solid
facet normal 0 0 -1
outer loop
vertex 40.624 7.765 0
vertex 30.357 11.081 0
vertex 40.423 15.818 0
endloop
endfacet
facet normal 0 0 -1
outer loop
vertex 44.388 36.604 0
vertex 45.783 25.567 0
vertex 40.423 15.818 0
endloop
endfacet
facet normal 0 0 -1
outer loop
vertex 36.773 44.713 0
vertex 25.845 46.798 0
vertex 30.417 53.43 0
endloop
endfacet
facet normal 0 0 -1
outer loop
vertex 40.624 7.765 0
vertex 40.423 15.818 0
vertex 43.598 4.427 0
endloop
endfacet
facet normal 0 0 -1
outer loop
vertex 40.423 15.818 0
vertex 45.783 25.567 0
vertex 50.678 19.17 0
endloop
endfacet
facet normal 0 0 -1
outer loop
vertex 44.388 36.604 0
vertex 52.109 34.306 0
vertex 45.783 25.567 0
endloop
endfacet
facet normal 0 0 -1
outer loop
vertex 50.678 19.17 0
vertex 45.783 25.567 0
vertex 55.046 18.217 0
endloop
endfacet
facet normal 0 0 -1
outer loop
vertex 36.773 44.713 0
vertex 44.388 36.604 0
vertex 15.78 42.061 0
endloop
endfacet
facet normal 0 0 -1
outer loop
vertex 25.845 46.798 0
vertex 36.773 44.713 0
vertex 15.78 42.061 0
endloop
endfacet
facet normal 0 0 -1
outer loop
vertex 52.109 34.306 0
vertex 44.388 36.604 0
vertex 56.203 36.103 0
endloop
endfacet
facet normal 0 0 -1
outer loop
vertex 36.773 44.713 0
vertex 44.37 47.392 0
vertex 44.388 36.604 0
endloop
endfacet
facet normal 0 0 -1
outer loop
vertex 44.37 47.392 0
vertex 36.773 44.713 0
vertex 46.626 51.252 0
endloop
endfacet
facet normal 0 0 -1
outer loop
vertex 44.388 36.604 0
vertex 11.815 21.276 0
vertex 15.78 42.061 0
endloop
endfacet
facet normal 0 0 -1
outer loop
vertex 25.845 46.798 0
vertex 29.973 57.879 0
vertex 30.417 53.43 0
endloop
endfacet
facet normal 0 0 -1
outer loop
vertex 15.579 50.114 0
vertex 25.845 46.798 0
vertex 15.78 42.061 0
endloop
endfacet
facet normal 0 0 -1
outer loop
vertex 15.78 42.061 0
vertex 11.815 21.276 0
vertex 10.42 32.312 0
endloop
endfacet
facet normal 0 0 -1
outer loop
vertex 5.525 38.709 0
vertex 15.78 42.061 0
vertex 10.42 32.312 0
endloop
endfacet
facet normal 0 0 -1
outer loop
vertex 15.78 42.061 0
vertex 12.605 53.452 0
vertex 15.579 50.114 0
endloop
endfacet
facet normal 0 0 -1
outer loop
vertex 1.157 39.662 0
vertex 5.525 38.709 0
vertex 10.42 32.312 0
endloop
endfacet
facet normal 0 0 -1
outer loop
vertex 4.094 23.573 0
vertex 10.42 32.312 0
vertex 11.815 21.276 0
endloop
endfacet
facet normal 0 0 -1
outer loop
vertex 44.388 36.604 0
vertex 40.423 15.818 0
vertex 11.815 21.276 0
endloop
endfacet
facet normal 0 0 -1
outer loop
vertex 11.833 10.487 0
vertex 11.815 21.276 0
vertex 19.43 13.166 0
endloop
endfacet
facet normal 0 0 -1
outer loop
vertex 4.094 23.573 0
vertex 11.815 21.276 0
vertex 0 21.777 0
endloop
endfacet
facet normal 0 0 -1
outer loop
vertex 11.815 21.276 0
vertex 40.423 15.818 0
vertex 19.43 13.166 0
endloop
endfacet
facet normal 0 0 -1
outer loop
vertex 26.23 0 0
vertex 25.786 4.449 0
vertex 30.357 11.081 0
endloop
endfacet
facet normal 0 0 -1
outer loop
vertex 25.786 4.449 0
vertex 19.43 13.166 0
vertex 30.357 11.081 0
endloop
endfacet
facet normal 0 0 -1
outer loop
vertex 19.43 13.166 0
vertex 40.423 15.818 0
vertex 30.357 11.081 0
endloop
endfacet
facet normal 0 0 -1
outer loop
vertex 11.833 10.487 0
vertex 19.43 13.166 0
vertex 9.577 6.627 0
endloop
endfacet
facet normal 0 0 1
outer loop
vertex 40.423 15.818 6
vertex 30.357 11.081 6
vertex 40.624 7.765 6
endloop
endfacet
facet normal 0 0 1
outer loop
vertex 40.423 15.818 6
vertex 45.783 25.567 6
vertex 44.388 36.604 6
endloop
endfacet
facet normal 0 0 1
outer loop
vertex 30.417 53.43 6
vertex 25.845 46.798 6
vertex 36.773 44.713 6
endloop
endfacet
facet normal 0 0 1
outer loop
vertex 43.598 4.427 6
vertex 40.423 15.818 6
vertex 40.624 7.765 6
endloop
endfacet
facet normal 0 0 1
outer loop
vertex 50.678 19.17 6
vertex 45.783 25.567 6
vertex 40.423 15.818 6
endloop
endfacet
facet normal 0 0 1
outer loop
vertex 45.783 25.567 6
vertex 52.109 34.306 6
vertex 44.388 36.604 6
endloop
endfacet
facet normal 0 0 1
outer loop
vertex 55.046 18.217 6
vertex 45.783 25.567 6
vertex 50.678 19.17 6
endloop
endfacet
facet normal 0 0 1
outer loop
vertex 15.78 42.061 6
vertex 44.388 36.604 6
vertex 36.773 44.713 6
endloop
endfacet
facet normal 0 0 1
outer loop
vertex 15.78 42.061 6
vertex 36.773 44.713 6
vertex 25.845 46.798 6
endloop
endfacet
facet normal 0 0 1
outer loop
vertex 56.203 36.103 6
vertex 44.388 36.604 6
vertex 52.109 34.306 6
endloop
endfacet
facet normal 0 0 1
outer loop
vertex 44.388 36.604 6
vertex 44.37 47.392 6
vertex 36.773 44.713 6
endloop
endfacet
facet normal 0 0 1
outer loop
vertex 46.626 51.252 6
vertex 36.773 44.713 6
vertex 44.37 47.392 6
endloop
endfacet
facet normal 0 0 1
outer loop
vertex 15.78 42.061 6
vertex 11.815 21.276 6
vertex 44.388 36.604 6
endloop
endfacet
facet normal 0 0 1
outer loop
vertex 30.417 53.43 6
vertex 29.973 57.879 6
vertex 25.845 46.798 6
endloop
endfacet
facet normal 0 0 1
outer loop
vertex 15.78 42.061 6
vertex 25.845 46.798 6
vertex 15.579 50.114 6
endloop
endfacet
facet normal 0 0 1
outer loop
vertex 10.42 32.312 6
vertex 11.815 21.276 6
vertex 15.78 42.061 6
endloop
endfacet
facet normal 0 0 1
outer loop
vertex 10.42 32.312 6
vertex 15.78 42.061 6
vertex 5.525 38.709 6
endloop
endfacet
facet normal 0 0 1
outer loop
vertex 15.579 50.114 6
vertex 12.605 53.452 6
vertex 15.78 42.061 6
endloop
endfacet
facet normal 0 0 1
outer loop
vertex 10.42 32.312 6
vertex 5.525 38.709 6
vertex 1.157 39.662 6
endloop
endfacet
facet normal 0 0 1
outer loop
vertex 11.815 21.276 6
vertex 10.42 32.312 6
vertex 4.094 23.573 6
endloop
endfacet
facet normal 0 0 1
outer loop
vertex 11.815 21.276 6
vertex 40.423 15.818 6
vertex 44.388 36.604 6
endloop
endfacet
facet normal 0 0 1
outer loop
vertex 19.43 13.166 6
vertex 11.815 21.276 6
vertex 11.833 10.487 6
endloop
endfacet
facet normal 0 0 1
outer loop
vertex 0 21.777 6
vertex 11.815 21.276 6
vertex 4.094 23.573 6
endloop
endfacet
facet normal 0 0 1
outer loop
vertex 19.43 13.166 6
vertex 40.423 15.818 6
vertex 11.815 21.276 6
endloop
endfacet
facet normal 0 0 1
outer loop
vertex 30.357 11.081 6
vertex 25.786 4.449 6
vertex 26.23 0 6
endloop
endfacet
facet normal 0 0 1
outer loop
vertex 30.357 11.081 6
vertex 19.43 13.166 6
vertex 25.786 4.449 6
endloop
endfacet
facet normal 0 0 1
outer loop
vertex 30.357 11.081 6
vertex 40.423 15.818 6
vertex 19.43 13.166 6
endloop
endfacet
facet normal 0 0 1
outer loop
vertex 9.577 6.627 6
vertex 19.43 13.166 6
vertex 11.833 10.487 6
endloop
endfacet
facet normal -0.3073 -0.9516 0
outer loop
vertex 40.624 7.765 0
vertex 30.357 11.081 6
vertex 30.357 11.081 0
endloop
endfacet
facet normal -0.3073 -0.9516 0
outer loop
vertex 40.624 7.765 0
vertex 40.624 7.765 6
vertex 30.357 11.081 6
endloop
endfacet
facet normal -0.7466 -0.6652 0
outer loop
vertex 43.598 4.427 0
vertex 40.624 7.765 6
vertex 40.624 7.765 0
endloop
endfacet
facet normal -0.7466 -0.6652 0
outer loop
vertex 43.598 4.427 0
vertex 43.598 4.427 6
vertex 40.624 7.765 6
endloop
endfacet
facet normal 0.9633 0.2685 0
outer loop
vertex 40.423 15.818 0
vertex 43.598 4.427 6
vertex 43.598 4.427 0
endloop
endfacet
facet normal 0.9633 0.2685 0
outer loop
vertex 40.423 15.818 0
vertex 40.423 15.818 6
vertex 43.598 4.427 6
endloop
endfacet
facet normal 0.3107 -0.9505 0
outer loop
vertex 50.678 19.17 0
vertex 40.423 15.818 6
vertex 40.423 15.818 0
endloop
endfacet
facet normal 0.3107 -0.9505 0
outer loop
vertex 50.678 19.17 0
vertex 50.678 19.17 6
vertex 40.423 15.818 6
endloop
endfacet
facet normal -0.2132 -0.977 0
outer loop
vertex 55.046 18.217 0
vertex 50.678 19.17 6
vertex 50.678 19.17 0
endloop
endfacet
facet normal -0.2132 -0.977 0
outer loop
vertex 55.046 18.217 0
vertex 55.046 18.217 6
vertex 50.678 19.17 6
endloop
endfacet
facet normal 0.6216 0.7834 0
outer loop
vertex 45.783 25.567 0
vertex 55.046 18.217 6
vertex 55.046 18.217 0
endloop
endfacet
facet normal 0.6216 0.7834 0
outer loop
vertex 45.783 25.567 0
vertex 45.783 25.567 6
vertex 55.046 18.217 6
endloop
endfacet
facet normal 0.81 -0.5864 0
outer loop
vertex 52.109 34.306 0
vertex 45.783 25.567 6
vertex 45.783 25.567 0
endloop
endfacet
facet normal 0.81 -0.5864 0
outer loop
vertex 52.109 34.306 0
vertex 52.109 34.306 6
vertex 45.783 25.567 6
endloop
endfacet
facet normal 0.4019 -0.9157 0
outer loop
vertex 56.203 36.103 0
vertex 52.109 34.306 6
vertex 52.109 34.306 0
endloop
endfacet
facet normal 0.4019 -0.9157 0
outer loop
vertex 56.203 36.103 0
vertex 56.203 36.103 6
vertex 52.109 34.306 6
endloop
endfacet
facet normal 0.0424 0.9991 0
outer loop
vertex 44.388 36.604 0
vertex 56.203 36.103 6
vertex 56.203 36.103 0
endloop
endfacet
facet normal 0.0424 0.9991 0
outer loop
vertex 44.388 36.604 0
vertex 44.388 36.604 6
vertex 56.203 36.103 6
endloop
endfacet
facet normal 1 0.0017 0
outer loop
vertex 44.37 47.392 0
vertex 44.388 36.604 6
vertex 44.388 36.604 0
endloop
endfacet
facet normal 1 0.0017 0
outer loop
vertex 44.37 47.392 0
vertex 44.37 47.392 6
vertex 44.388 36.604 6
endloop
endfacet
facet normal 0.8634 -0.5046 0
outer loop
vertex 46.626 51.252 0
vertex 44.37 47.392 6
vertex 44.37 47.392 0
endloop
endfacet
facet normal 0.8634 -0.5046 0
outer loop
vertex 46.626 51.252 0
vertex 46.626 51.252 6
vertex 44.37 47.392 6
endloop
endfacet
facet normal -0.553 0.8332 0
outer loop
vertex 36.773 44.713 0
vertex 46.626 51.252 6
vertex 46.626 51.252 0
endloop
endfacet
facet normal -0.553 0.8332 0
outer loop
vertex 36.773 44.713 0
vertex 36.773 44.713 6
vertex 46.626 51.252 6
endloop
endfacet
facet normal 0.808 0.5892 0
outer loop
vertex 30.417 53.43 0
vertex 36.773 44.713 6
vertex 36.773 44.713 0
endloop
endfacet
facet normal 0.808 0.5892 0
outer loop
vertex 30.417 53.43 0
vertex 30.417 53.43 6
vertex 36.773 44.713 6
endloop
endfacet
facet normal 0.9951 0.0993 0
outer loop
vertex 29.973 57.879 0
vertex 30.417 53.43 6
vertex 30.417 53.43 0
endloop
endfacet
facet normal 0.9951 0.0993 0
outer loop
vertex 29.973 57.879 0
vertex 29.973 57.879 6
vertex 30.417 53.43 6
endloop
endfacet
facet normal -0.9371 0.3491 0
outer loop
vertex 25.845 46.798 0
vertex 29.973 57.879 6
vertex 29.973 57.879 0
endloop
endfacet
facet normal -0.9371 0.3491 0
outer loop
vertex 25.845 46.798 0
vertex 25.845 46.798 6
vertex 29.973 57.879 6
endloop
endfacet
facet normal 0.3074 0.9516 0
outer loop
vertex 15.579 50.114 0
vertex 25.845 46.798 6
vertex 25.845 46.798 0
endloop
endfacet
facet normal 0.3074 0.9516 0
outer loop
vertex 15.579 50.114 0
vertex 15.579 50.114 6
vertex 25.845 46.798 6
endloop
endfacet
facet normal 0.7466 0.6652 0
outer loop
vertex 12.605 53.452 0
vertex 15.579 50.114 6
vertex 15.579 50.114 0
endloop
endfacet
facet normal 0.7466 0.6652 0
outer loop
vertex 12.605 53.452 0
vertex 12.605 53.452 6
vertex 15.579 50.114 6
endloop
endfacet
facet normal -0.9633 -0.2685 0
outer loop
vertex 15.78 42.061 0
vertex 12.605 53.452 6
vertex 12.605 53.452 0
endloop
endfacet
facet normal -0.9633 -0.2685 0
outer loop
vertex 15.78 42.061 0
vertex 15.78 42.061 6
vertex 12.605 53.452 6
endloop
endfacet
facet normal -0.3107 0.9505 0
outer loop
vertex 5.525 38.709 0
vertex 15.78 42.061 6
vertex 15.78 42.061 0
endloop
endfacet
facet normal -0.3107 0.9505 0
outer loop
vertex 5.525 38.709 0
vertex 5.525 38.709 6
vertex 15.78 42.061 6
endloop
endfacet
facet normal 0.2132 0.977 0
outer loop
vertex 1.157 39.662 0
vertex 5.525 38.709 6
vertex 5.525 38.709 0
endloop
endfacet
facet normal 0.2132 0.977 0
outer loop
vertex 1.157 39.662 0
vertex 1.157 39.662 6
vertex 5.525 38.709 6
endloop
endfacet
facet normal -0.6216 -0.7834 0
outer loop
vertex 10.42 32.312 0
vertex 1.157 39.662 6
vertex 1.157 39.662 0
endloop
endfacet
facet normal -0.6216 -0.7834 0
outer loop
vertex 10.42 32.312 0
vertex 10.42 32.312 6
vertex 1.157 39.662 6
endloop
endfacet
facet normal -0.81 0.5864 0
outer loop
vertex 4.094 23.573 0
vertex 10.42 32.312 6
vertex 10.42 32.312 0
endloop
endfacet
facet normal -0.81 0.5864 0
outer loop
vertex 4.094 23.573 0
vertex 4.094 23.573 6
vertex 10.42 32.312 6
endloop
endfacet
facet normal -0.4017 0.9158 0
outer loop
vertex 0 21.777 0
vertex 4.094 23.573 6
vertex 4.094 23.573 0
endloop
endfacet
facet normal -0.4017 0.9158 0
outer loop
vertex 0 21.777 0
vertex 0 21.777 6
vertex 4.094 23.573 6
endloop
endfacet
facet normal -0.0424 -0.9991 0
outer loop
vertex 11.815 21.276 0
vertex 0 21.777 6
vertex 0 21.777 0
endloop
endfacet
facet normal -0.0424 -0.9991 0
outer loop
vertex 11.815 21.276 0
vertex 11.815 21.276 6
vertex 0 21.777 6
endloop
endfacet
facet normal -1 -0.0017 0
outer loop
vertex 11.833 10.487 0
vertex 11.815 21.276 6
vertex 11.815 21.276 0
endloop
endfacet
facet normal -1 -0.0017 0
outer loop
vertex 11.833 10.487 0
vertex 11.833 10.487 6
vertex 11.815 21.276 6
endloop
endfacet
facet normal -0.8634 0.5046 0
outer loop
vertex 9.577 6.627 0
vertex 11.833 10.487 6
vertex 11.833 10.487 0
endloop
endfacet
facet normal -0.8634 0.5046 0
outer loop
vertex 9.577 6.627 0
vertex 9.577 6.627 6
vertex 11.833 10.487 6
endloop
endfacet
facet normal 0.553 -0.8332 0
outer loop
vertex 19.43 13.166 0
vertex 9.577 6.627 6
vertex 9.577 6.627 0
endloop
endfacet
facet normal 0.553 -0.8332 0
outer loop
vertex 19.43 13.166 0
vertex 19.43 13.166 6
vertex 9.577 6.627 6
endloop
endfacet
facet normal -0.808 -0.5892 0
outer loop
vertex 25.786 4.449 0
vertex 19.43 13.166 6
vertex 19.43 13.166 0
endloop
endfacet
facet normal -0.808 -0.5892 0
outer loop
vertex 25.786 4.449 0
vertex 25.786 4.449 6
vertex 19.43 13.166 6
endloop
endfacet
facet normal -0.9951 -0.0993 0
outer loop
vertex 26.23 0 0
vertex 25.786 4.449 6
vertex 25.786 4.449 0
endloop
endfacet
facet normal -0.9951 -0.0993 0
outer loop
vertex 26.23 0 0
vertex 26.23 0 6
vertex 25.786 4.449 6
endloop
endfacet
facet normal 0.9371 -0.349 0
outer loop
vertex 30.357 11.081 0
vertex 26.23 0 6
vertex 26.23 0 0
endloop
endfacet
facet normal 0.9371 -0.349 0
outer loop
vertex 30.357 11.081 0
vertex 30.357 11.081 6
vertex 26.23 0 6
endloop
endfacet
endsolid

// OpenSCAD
$fn = 32;

// ----------------------------------------------------------------------
// Fan rotor section: 10 blades, 18 mm hub radius, 11 mm blades
// ----------------------------------------------------------------------

// --- parameters (mm) ---
profile_height = 6;       // extrusion height
profile_points = 30;      // points of the closed outline

profile = [[45.783, 25.567], [52.109, 34.306], [56.203, 36.103], [44.388, 36.604], [44.37, 47.392], [46.626, 51.252], [36.773, 44.713], [30.417, 53.43], [29.973, 57.879], [25.845, 46.798], [15.579, 50.114], [12.605, 53.452], [15.78, 42.061], [5.525, 38.709], [1.157, 39.662], [10.42, 32.312], [4.094, 23.573], [0, 21.777], [11.815, 21.276], [11.833, 10.487], [9.577, 6.627], [19.43, 13.166], [25.786, 4.449], [26.23, 0], [30.357, 11.081], [40.624, 7.765], [43.598, 4.427], [40.423, 15.818], [50.678, 19.17], [55.046, 18.217]];  // single closed polygon, 30 points, counter clockwise

// --- the one profile operation ---
linear_extrude(height = profile_height) polygon(points = profile);
